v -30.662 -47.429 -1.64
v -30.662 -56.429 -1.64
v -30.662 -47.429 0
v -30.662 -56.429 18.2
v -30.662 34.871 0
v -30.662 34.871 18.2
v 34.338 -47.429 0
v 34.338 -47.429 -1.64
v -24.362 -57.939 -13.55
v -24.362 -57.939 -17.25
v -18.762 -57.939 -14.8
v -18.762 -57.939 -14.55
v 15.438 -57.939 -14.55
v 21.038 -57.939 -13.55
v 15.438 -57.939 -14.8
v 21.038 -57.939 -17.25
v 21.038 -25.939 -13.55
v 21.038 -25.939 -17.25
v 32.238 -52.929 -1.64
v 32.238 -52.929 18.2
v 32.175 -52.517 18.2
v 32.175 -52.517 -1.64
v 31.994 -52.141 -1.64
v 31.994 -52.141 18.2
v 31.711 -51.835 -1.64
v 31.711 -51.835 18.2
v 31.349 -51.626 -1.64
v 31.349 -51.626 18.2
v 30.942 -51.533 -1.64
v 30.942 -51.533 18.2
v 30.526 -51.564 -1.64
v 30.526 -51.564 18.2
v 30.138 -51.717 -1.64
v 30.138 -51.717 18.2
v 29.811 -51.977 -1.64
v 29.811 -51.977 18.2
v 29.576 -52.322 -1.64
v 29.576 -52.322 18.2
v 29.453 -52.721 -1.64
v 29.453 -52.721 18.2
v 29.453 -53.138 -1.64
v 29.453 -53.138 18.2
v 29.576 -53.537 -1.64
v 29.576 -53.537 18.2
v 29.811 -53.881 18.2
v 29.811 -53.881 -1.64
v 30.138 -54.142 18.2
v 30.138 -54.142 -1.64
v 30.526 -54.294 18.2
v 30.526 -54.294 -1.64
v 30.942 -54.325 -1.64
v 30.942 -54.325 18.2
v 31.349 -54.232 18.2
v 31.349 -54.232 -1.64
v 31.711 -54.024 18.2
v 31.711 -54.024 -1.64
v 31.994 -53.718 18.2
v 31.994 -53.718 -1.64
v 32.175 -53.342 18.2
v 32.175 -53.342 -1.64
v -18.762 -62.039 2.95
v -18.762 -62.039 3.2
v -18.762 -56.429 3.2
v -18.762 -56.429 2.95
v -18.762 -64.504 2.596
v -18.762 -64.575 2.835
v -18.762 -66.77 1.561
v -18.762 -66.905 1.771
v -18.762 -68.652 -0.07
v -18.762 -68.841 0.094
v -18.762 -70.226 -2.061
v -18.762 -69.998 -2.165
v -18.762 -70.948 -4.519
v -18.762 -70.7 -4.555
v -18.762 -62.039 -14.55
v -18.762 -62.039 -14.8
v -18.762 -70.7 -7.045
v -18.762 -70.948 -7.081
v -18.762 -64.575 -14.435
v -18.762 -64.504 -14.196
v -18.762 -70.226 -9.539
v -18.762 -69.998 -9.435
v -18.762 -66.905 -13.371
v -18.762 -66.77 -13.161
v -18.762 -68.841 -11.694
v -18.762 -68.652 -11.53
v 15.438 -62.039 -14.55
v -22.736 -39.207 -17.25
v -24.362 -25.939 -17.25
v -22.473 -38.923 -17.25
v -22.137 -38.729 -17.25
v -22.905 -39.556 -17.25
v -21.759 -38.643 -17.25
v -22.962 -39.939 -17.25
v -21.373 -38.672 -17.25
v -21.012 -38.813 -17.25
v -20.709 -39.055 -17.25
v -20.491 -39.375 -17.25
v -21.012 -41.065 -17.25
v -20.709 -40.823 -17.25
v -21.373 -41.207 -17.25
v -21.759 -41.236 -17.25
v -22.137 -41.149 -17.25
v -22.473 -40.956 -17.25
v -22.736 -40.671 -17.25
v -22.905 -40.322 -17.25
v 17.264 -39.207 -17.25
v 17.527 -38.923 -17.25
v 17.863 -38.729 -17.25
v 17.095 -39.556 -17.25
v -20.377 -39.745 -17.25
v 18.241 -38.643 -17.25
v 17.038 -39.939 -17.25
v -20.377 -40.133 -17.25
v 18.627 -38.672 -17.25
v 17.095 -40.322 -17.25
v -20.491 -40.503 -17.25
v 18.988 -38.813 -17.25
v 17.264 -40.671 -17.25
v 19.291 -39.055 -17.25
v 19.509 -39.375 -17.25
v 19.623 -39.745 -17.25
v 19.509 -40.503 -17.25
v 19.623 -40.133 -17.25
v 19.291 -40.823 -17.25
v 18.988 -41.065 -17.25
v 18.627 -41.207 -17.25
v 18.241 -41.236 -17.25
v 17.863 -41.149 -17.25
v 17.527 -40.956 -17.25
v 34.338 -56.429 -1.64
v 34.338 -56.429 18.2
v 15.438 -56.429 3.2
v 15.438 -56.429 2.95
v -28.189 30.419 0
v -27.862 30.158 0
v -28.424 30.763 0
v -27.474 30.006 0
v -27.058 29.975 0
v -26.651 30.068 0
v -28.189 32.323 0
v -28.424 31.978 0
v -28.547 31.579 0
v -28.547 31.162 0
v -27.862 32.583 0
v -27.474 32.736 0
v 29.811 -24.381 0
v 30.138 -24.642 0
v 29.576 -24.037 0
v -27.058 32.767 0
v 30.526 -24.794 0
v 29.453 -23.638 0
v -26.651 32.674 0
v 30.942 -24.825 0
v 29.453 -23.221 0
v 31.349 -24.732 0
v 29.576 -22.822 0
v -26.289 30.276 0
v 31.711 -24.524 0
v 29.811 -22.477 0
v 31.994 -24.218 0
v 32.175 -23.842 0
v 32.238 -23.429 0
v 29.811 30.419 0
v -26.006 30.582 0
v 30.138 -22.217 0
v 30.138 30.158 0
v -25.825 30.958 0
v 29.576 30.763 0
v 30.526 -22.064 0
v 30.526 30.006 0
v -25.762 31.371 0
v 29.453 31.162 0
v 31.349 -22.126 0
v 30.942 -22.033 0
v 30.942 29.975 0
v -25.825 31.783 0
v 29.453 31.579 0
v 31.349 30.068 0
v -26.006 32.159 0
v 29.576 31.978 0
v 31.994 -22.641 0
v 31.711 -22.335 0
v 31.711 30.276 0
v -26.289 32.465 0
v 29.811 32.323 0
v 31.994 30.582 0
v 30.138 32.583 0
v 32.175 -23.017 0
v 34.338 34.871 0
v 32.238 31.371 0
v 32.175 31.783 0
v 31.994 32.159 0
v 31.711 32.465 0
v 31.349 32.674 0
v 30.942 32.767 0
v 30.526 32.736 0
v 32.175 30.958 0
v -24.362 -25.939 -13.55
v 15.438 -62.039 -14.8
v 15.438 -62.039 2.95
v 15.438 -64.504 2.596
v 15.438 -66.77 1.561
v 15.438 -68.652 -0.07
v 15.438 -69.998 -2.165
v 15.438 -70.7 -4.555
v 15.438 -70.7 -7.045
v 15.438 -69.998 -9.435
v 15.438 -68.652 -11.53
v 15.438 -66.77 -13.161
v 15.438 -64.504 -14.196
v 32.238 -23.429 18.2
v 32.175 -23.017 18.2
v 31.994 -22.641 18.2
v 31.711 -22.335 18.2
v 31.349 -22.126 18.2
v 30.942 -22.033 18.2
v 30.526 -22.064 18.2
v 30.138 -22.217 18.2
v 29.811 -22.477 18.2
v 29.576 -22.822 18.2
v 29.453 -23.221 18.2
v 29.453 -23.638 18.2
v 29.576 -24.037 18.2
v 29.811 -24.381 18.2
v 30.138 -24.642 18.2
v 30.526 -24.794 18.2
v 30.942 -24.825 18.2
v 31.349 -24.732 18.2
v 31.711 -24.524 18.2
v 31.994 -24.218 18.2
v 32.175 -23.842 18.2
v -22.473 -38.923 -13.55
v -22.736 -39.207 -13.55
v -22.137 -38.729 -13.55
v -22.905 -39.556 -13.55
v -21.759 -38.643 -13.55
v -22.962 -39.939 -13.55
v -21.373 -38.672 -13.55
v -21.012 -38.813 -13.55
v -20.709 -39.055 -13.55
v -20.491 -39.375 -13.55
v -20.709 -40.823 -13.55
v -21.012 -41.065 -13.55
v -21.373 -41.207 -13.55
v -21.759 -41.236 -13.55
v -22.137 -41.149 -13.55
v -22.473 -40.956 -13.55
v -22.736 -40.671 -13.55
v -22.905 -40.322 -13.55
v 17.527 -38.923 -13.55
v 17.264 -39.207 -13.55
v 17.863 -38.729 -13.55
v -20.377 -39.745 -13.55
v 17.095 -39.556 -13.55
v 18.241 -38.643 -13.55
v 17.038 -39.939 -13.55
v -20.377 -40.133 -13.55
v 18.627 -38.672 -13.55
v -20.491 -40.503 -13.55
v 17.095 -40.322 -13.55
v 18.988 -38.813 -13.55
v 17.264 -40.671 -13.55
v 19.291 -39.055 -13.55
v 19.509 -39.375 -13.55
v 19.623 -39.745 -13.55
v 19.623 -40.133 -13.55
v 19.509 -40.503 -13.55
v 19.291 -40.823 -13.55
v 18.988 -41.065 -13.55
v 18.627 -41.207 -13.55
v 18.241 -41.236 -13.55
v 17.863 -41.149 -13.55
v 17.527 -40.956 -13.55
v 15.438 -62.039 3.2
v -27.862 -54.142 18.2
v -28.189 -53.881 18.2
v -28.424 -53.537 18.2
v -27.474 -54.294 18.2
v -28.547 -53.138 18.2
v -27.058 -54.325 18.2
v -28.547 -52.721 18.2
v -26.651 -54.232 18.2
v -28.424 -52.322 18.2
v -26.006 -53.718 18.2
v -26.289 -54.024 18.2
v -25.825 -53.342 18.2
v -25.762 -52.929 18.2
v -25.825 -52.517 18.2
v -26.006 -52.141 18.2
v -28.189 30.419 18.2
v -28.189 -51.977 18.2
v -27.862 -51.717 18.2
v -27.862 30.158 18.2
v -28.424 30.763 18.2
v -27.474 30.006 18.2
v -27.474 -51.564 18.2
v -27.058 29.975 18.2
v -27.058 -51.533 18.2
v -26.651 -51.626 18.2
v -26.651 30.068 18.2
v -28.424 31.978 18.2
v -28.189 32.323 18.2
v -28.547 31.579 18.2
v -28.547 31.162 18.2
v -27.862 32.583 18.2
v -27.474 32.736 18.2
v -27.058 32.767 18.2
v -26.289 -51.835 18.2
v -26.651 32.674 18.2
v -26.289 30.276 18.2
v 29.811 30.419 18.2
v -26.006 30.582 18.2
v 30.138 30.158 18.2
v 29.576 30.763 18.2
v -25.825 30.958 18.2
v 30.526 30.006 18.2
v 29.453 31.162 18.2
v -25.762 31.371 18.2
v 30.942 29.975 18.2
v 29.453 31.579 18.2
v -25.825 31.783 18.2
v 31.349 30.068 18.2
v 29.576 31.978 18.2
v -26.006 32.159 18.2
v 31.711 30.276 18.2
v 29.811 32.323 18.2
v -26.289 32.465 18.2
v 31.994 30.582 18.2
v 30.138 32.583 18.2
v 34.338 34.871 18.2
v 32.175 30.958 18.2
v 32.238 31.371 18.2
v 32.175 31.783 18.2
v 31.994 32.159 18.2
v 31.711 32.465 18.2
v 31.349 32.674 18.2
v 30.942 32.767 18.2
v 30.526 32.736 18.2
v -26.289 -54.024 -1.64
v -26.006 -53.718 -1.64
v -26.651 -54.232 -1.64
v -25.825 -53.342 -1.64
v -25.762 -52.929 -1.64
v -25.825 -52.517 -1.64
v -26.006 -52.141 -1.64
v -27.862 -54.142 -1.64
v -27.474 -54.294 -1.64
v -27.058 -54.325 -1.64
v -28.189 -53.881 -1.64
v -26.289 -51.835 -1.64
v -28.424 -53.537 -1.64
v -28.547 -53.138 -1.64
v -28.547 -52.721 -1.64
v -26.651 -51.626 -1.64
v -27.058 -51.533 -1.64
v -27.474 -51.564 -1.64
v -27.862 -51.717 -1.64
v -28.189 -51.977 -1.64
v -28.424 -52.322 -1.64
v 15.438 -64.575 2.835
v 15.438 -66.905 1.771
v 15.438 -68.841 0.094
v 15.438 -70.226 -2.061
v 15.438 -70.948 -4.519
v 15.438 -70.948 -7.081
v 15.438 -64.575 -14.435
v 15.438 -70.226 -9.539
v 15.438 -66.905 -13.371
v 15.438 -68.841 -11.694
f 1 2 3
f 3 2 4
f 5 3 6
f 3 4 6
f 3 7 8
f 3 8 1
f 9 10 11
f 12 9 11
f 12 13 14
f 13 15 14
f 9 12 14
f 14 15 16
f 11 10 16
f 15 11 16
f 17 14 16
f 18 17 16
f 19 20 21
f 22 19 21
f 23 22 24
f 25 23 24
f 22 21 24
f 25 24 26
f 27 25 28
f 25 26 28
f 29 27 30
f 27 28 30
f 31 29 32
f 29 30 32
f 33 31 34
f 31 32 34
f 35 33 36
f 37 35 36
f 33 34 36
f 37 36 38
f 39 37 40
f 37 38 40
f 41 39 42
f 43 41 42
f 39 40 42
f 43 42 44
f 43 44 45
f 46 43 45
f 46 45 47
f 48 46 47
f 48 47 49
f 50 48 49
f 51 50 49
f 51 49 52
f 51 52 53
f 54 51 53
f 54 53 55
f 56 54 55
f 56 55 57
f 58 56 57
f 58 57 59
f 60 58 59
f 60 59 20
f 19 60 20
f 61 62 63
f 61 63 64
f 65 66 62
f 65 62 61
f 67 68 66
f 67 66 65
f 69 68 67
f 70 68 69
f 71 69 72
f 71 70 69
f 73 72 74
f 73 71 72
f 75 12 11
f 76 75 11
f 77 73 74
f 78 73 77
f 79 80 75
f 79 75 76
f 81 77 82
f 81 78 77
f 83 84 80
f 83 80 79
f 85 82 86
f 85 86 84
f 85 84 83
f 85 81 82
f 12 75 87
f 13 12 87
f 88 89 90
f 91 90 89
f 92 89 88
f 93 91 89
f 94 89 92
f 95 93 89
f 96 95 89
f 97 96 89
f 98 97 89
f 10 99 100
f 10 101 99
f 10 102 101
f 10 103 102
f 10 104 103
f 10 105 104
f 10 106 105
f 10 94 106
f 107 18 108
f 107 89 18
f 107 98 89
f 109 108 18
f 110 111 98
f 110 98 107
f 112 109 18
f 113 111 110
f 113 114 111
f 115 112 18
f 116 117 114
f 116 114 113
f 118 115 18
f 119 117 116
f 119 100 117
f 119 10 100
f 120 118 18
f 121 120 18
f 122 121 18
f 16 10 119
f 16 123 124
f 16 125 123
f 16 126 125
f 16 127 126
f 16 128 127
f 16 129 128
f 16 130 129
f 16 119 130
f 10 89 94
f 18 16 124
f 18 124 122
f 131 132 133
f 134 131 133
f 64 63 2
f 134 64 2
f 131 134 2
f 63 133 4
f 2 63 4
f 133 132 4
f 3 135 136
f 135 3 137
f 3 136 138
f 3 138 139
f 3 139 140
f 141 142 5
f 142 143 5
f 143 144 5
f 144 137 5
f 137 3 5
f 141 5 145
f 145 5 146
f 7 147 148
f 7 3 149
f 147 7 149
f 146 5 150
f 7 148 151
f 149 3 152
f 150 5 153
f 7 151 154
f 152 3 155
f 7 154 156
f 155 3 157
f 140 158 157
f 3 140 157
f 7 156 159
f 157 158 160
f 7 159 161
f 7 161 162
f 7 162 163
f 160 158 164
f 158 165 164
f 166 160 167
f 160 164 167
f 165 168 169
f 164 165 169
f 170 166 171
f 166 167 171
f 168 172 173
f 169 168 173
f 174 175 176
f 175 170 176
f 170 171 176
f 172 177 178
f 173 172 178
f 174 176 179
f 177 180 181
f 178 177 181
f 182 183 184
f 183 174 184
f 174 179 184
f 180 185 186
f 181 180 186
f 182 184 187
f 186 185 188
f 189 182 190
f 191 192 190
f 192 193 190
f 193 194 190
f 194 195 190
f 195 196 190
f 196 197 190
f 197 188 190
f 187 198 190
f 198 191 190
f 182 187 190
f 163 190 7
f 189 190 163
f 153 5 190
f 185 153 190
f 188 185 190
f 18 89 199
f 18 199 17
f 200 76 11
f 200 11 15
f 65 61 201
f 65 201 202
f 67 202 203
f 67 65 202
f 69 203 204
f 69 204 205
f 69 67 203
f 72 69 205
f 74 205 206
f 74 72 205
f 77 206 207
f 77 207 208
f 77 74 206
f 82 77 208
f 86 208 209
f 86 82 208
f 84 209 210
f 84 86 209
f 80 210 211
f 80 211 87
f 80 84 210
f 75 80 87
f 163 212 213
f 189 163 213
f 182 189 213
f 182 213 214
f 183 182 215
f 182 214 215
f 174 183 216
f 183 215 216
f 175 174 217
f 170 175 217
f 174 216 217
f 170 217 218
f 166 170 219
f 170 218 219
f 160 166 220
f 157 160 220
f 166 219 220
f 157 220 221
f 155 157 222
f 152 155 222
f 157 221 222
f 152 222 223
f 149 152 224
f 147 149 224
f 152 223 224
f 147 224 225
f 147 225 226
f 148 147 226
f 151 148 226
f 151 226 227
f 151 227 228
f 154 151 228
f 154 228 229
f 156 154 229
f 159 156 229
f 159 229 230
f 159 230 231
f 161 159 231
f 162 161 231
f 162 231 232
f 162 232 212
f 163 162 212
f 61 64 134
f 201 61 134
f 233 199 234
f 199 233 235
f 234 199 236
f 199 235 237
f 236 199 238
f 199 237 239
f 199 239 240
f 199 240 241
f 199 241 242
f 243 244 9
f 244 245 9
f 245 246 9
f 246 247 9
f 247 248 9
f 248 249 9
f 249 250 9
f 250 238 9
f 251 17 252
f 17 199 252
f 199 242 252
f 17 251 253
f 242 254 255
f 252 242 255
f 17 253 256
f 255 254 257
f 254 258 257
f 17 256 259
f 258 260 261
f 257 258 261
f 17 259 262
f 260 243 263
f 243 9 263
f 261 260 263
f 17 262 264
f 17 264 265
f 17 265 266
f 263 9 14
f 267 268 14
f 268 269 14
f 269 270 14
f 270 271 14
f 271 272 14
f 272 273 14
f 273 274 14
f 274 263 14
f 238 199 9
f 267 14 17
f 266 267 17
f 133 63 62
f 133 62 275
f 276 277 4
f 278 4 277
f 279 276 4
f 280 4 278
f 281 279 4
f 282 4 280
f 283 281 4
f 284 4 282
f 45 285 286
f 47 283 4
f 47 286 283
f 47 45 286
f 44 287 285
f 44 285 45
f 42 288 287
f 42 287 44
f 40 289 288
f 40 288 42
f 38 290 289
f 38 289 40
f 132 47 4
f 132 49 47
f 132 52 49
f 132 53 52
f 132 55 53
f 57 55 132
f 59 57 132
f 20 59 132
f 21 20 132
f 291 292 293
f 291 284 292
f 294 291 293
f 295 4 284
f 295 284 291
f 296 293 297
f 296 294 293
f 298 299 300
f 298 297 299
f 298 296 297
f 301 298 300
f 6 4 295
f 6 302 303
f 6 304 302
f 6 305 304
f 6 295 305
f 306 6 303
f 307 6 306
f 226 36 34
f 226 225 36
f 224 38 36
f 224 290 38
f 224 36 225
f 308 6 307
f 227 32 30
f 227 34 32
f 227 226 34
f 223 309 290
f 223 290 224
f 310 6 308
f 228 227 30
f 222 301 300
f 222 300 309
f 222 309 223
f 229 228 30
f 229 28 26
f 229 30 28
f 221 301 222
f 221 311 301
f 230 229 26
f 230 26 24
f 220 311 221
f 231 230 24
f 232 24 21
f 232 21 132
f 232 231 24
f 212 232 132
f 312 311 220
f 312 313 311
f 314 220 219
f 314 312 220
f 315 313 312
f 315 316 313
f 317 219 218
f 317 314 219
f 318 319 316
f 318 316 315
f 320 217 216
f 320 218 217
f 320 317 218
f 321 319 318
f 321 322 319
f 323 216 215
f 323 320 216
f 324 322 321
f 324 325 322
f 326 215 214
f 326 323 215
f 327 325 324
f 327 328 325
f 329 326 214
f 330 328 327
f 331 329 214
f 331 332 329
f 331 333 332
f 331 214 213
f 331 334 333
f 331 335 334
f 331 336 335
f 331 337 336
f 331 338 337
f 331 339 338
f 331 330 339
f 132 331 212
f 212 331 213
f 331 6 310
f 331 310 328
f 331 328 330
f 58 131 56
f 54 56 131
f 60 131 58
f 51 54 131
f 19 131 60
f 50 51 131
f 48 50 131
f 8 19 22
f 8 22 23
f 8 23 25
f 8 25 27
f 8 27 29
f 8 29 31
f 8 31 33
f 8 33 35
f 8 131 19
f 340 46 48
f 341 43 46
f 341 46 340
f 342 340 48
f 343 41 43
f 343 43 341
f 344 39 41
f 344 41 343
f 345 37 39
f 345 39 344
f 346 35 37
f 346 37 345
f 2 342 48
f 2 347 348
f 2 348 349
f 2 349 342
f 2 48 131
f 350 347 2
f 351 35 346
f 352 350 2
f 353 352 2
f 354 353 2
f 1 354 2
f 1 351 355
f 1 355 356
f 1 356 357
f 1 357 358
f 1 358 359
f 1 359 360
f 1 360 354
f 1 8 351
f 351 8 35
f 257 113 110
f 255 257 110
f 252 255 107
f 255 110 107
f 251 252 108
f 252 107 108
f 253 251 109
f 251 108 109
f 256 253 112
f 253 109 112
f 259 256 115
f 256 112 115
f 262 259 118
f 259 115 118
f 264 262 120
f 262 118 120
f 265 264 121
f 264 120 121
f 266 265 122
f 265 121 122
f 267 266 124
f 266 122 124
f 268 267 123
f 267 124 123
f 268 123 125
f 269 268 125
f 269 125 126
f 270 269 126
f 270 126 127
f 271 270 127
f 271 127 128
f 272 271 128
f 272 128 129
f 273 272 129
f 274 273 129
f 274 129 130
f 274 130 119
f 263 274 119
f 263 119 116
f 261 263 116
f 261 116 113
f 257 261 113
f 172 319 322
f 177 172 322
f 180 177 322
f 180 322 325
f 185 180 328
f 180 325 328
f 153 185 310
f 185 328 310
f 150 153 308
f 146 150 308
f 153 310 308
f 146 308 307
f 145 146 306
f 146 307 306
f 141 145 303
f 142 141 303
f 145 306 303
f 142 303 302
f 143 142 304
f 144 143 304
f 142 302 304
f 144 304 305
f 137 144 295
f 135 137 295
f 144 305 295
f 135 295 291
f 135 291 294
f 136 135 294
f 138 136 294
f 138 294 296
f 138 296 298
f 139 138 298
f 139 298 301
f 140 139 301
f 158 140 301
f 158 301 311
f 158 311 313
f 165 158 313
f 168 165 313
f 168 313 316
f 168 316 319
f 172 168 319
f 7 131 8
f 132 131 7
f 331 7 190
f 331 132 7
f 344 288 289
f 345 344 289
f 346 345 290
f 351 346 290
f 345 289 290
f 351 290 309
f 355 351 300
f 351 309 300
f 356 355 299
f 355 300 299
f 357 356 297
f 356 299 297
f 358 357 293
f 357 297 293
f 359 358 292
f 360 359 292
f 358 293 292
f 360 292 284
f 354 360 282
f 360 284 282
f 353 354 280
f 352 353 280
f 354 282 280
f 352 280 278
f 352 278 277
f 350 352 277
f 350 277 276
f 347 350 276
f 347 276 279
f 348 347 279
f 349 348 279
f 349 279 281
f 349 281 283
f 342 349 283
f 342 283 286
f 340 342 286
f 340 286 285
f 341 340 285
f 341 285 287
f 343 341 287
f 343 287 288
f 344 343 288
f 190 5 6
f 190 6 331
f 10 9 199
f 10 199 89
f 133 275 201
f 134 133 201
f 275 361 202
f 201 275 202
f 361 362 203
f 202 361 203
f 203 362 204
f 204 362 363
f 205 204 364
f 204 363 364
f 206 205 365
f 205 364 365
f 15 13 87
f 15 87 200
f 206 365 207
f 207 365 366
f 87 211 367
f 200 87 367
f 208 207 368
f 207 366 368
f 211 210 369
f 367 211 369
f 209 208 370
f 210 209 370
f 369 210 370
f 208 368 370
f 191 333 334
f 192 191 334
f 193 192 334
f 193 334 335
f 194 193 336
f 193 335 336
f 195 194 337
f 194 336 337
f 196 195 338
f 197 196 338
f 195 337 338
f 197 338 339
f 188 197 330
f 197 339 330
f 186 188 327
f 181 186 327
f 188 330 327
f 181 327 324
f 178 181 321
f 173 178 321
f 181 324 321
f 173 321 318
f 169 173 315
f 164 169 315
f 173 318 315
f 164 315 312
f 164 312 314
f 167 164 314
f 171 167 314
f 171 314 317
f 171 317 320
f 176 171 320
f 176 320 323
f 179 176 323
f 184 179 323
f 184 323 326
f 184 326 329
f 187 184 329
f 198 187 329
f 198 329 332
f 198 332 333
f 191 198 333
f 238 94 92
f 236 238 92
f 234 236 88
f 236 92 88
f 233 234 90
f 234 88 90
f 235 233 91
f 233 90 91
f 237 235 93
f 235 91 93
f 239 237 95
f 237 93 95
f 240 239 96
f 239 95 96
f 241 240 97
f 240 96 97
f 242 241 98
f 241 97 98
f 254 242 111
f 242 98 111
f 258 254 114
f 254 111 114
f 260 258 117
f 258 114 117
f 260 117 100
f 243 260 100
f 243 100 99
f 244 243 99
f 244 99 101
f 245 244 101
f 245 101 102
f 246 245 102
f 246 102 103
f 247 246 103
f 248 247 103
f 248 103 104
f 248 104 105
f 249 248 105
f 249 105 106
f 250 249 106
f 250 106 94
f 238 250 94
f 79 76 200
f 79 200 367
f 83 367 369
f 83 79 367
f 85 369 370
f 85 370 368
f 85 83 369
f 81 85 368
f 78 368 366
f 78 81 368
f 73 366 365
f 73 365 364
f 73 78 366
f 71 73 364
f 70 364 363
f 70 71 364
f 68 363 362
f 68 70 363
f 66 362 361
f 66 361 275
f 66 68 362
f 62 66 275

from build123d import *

# Parameters (mm, degrees)
SKETCH1_W            = 65
SKETCH1_H            = 91.3
BOSS_EXTRUDE2_DEPTH  = 18.2
SKETCH12_W           = 65
SKETCH12_H           = 9
BOSS_EXTRUDE7_DEPTH  = 1.64
SKETCH13_W           = 34.2
SKETCH13_H           = 0.25
BOSS_EXTRUDE8_DEPTH  = 5.61
BOSS_EXTRUDE13_DEPTH = 34.2
SKETCH19_W           = 34.2
SKETCH19_H           = 0.25
BOSS_EXTRUDE14_DEPTH = 4.1
SKETCH20_W           = 45.4
SKETCH20_H           = 3.7
BOSS_EXTRUDE15_DEPTH = 32
SKETCH21_R           = 1.4
CUT_EXTRUDE2_DEPTH   = 32
SKETCH22_R           = 1.4
CUT_EXTRUDE3_DEPTH   = 61
SKETCH23_R           = 1.4
CUT_EXTRUDE4_DEPTH   = 61
SKETCH24_R           = 1.4
CUT_EXTRUDE5_DEPTH   = 61
SKETCH25_R           = 1.3
CUT_EXTRUDE6_DEPTH   = 10
SKETCH26_R           = 1.3
CUT_EXTRUDE7_DEPTH   = 10
SKETCH27_R           = 1.4
CUT_EXTRUDE9_DEPTH   = 1500


with BuildPart() as part:
    # Sketch1 → Boss-Extrude2 (new body)
    with BuildSketch(Plane.XY):
        with Locations((1.837659334, -10.779179331)):
            Rectangle(SKETCH1_W, SKETCH1_H)
    extrude(amount=BOSS_EXTRUDE2_DEPTH)

    # Sketch12 → Boss-Extrude7 (add)
    with BuildSketch(Plane(origin=(0, 0, 0), x_dir=(-1, 0, 0), z_dir=(0, 0, -1))):
        with Locations((-1.837659334, -51.929179331)):
            Rectangle(SKETCH12_W, SKETCH12_H)
    extrude(amount=BOSS_EXTRUDE7_DEPTH)

    # Sketch13 → Boss-Extrude8 (add)
    with BuildSketch(Plane.XZ.offset(56.429179331)):
        with Locations((-1.662340666, 3.075)):
            Rectangle(SKETCH13_W, SKETCH13_H)
    extrude(amount=BOSS_EXTRUDE8_DEPTH)

    # Sketch18 → Boss-Extrude13 (add)
    with BuildSketch(Plane.ZY.offset(18.762340666)):
        with BuildLine():
            Line((3.2, -62.039179331), (2.95, -62.039179331))
            ThreePointArc((2.95, -62.039179331), (-5.8, -70.789179331), (-14.55, -62.039179331))
            Line((-14.55, -62.039179331), (-14.8, -62.039179331))
            ThreePointArc((-14.8, -62.039179331), (-5.8, -71.039179331), (3.2, -62.039179331))
        make_face()
    extrude(amount=-BOSS_EXTRUDE13_DEPTH)

    # Sketch19 → Boss-Extrude14 (add)
    with BuildSketch(Plane(origin=(0, -62.039179331, 0), x_dir=(1, 0, 0), z_dir=(0, 1, 0))):
        with Locations((-1.662340666, 14.675)):
            Rectangle(SKETCH19_W, SKETCH19_H)
    extrude(amount=BOSS_EXTRUDE14_DEPTH)

    # Sketch20 → Boss-Extrude15 (add)
    with BuildSketch(Plane(origin=(0, -57.939179331, 0), x_dir=(1, 0, 0), z_dir=(0, 1, 0))):
        with Locations((-1.662340666, 15.4)):
            Rectangle(SKETCH20_W, SKETCH20_H)
    extrude(amount=BOSS_EXTRUDE15_DEPTH)

    # Sketch21 → Cut-Extrude2 (cut)
    with BuildSketch(Plane.XY.offset(18.2)):
        with Locations((30.837659334, 31.370820669)):
            Circle(SKETCH21_R)
    extrude(amount=-CUT_EXTRUDE2_DEPTH, mode=Mode.SUBTRACT)

    # Sketch22 → Cut-Extrude3 (cut)
    with BuildSketch(Plane.XY.offset(18.2)):
        with Locations((-27.162340666, 31.370820669)):
            Circle(SKETCH22_R)
    extrude(amount=-CUT_EXTRUDE3_DEPTH, mode=Mode.SUBTRACT)

    # Sketch23 → Cut-Extrude4 (cut)
    with BuildSketch(Plane.XY.offset(18.2)):
        with Locations((30.837659334, -52.929179331)):
            Circle(SKETCH23_R)
    extrude(amount=-CUT_EXTRUDE4_DEPTH, mode=Mode.SUBTRACT)

    # Sketch24 → Cut-Extrude5 (cut)
    with BuildSketch(Plane.XY.offset(18.2)):
        with Locations((-27.162340666, -52.929179331)):
            Circle(SKETCH24_R)
    extrude(amount=-CUT_EXTRUDE5_DEPTH, mode=Mode.SUBTRACT)

    # Sketch25 → Cut-Extrude6 (cut)
    with BuildSketch(Plane(origin=(0, 0, -17.25), x_dir=(-1, 0, 0), z_dir=(0, 0, -1))):
        with Locations((21.662340666, -39.939179331)):
            Circle(SKETCH25_R)
    extrude(amount=-CUT_EXTRUDE6_DEPTH, mode=Mode.SUBTRACT)

    # Sketch26 → Cut-Extrude7 (cut)
    with BuildSketch(Plane(origin=(0, 0, -17.25), x_dir=(-1, 0, 0), z_dir=(0, 0, -1))):
        with Locations((-18.337659334, -39.939179331)):
            Circle(SKETCH26_R)
    extrude(amount=-CUT_EXTRUDE7_DEPTH, mode=Mode.SUBTRACT)

    # Sketch27 → Cut-Extrude9 (cut)
    with BuildSketch(Plane.XY.offset(18.2)):
        with Locations((30.837659334, -23.429179331)):
            Circle(SKETCH27_R)
    extrude(amount=-CUT_EXTRUDE9_DEPTH, mode=Mode.SUBTRACT)


solid = part.part
